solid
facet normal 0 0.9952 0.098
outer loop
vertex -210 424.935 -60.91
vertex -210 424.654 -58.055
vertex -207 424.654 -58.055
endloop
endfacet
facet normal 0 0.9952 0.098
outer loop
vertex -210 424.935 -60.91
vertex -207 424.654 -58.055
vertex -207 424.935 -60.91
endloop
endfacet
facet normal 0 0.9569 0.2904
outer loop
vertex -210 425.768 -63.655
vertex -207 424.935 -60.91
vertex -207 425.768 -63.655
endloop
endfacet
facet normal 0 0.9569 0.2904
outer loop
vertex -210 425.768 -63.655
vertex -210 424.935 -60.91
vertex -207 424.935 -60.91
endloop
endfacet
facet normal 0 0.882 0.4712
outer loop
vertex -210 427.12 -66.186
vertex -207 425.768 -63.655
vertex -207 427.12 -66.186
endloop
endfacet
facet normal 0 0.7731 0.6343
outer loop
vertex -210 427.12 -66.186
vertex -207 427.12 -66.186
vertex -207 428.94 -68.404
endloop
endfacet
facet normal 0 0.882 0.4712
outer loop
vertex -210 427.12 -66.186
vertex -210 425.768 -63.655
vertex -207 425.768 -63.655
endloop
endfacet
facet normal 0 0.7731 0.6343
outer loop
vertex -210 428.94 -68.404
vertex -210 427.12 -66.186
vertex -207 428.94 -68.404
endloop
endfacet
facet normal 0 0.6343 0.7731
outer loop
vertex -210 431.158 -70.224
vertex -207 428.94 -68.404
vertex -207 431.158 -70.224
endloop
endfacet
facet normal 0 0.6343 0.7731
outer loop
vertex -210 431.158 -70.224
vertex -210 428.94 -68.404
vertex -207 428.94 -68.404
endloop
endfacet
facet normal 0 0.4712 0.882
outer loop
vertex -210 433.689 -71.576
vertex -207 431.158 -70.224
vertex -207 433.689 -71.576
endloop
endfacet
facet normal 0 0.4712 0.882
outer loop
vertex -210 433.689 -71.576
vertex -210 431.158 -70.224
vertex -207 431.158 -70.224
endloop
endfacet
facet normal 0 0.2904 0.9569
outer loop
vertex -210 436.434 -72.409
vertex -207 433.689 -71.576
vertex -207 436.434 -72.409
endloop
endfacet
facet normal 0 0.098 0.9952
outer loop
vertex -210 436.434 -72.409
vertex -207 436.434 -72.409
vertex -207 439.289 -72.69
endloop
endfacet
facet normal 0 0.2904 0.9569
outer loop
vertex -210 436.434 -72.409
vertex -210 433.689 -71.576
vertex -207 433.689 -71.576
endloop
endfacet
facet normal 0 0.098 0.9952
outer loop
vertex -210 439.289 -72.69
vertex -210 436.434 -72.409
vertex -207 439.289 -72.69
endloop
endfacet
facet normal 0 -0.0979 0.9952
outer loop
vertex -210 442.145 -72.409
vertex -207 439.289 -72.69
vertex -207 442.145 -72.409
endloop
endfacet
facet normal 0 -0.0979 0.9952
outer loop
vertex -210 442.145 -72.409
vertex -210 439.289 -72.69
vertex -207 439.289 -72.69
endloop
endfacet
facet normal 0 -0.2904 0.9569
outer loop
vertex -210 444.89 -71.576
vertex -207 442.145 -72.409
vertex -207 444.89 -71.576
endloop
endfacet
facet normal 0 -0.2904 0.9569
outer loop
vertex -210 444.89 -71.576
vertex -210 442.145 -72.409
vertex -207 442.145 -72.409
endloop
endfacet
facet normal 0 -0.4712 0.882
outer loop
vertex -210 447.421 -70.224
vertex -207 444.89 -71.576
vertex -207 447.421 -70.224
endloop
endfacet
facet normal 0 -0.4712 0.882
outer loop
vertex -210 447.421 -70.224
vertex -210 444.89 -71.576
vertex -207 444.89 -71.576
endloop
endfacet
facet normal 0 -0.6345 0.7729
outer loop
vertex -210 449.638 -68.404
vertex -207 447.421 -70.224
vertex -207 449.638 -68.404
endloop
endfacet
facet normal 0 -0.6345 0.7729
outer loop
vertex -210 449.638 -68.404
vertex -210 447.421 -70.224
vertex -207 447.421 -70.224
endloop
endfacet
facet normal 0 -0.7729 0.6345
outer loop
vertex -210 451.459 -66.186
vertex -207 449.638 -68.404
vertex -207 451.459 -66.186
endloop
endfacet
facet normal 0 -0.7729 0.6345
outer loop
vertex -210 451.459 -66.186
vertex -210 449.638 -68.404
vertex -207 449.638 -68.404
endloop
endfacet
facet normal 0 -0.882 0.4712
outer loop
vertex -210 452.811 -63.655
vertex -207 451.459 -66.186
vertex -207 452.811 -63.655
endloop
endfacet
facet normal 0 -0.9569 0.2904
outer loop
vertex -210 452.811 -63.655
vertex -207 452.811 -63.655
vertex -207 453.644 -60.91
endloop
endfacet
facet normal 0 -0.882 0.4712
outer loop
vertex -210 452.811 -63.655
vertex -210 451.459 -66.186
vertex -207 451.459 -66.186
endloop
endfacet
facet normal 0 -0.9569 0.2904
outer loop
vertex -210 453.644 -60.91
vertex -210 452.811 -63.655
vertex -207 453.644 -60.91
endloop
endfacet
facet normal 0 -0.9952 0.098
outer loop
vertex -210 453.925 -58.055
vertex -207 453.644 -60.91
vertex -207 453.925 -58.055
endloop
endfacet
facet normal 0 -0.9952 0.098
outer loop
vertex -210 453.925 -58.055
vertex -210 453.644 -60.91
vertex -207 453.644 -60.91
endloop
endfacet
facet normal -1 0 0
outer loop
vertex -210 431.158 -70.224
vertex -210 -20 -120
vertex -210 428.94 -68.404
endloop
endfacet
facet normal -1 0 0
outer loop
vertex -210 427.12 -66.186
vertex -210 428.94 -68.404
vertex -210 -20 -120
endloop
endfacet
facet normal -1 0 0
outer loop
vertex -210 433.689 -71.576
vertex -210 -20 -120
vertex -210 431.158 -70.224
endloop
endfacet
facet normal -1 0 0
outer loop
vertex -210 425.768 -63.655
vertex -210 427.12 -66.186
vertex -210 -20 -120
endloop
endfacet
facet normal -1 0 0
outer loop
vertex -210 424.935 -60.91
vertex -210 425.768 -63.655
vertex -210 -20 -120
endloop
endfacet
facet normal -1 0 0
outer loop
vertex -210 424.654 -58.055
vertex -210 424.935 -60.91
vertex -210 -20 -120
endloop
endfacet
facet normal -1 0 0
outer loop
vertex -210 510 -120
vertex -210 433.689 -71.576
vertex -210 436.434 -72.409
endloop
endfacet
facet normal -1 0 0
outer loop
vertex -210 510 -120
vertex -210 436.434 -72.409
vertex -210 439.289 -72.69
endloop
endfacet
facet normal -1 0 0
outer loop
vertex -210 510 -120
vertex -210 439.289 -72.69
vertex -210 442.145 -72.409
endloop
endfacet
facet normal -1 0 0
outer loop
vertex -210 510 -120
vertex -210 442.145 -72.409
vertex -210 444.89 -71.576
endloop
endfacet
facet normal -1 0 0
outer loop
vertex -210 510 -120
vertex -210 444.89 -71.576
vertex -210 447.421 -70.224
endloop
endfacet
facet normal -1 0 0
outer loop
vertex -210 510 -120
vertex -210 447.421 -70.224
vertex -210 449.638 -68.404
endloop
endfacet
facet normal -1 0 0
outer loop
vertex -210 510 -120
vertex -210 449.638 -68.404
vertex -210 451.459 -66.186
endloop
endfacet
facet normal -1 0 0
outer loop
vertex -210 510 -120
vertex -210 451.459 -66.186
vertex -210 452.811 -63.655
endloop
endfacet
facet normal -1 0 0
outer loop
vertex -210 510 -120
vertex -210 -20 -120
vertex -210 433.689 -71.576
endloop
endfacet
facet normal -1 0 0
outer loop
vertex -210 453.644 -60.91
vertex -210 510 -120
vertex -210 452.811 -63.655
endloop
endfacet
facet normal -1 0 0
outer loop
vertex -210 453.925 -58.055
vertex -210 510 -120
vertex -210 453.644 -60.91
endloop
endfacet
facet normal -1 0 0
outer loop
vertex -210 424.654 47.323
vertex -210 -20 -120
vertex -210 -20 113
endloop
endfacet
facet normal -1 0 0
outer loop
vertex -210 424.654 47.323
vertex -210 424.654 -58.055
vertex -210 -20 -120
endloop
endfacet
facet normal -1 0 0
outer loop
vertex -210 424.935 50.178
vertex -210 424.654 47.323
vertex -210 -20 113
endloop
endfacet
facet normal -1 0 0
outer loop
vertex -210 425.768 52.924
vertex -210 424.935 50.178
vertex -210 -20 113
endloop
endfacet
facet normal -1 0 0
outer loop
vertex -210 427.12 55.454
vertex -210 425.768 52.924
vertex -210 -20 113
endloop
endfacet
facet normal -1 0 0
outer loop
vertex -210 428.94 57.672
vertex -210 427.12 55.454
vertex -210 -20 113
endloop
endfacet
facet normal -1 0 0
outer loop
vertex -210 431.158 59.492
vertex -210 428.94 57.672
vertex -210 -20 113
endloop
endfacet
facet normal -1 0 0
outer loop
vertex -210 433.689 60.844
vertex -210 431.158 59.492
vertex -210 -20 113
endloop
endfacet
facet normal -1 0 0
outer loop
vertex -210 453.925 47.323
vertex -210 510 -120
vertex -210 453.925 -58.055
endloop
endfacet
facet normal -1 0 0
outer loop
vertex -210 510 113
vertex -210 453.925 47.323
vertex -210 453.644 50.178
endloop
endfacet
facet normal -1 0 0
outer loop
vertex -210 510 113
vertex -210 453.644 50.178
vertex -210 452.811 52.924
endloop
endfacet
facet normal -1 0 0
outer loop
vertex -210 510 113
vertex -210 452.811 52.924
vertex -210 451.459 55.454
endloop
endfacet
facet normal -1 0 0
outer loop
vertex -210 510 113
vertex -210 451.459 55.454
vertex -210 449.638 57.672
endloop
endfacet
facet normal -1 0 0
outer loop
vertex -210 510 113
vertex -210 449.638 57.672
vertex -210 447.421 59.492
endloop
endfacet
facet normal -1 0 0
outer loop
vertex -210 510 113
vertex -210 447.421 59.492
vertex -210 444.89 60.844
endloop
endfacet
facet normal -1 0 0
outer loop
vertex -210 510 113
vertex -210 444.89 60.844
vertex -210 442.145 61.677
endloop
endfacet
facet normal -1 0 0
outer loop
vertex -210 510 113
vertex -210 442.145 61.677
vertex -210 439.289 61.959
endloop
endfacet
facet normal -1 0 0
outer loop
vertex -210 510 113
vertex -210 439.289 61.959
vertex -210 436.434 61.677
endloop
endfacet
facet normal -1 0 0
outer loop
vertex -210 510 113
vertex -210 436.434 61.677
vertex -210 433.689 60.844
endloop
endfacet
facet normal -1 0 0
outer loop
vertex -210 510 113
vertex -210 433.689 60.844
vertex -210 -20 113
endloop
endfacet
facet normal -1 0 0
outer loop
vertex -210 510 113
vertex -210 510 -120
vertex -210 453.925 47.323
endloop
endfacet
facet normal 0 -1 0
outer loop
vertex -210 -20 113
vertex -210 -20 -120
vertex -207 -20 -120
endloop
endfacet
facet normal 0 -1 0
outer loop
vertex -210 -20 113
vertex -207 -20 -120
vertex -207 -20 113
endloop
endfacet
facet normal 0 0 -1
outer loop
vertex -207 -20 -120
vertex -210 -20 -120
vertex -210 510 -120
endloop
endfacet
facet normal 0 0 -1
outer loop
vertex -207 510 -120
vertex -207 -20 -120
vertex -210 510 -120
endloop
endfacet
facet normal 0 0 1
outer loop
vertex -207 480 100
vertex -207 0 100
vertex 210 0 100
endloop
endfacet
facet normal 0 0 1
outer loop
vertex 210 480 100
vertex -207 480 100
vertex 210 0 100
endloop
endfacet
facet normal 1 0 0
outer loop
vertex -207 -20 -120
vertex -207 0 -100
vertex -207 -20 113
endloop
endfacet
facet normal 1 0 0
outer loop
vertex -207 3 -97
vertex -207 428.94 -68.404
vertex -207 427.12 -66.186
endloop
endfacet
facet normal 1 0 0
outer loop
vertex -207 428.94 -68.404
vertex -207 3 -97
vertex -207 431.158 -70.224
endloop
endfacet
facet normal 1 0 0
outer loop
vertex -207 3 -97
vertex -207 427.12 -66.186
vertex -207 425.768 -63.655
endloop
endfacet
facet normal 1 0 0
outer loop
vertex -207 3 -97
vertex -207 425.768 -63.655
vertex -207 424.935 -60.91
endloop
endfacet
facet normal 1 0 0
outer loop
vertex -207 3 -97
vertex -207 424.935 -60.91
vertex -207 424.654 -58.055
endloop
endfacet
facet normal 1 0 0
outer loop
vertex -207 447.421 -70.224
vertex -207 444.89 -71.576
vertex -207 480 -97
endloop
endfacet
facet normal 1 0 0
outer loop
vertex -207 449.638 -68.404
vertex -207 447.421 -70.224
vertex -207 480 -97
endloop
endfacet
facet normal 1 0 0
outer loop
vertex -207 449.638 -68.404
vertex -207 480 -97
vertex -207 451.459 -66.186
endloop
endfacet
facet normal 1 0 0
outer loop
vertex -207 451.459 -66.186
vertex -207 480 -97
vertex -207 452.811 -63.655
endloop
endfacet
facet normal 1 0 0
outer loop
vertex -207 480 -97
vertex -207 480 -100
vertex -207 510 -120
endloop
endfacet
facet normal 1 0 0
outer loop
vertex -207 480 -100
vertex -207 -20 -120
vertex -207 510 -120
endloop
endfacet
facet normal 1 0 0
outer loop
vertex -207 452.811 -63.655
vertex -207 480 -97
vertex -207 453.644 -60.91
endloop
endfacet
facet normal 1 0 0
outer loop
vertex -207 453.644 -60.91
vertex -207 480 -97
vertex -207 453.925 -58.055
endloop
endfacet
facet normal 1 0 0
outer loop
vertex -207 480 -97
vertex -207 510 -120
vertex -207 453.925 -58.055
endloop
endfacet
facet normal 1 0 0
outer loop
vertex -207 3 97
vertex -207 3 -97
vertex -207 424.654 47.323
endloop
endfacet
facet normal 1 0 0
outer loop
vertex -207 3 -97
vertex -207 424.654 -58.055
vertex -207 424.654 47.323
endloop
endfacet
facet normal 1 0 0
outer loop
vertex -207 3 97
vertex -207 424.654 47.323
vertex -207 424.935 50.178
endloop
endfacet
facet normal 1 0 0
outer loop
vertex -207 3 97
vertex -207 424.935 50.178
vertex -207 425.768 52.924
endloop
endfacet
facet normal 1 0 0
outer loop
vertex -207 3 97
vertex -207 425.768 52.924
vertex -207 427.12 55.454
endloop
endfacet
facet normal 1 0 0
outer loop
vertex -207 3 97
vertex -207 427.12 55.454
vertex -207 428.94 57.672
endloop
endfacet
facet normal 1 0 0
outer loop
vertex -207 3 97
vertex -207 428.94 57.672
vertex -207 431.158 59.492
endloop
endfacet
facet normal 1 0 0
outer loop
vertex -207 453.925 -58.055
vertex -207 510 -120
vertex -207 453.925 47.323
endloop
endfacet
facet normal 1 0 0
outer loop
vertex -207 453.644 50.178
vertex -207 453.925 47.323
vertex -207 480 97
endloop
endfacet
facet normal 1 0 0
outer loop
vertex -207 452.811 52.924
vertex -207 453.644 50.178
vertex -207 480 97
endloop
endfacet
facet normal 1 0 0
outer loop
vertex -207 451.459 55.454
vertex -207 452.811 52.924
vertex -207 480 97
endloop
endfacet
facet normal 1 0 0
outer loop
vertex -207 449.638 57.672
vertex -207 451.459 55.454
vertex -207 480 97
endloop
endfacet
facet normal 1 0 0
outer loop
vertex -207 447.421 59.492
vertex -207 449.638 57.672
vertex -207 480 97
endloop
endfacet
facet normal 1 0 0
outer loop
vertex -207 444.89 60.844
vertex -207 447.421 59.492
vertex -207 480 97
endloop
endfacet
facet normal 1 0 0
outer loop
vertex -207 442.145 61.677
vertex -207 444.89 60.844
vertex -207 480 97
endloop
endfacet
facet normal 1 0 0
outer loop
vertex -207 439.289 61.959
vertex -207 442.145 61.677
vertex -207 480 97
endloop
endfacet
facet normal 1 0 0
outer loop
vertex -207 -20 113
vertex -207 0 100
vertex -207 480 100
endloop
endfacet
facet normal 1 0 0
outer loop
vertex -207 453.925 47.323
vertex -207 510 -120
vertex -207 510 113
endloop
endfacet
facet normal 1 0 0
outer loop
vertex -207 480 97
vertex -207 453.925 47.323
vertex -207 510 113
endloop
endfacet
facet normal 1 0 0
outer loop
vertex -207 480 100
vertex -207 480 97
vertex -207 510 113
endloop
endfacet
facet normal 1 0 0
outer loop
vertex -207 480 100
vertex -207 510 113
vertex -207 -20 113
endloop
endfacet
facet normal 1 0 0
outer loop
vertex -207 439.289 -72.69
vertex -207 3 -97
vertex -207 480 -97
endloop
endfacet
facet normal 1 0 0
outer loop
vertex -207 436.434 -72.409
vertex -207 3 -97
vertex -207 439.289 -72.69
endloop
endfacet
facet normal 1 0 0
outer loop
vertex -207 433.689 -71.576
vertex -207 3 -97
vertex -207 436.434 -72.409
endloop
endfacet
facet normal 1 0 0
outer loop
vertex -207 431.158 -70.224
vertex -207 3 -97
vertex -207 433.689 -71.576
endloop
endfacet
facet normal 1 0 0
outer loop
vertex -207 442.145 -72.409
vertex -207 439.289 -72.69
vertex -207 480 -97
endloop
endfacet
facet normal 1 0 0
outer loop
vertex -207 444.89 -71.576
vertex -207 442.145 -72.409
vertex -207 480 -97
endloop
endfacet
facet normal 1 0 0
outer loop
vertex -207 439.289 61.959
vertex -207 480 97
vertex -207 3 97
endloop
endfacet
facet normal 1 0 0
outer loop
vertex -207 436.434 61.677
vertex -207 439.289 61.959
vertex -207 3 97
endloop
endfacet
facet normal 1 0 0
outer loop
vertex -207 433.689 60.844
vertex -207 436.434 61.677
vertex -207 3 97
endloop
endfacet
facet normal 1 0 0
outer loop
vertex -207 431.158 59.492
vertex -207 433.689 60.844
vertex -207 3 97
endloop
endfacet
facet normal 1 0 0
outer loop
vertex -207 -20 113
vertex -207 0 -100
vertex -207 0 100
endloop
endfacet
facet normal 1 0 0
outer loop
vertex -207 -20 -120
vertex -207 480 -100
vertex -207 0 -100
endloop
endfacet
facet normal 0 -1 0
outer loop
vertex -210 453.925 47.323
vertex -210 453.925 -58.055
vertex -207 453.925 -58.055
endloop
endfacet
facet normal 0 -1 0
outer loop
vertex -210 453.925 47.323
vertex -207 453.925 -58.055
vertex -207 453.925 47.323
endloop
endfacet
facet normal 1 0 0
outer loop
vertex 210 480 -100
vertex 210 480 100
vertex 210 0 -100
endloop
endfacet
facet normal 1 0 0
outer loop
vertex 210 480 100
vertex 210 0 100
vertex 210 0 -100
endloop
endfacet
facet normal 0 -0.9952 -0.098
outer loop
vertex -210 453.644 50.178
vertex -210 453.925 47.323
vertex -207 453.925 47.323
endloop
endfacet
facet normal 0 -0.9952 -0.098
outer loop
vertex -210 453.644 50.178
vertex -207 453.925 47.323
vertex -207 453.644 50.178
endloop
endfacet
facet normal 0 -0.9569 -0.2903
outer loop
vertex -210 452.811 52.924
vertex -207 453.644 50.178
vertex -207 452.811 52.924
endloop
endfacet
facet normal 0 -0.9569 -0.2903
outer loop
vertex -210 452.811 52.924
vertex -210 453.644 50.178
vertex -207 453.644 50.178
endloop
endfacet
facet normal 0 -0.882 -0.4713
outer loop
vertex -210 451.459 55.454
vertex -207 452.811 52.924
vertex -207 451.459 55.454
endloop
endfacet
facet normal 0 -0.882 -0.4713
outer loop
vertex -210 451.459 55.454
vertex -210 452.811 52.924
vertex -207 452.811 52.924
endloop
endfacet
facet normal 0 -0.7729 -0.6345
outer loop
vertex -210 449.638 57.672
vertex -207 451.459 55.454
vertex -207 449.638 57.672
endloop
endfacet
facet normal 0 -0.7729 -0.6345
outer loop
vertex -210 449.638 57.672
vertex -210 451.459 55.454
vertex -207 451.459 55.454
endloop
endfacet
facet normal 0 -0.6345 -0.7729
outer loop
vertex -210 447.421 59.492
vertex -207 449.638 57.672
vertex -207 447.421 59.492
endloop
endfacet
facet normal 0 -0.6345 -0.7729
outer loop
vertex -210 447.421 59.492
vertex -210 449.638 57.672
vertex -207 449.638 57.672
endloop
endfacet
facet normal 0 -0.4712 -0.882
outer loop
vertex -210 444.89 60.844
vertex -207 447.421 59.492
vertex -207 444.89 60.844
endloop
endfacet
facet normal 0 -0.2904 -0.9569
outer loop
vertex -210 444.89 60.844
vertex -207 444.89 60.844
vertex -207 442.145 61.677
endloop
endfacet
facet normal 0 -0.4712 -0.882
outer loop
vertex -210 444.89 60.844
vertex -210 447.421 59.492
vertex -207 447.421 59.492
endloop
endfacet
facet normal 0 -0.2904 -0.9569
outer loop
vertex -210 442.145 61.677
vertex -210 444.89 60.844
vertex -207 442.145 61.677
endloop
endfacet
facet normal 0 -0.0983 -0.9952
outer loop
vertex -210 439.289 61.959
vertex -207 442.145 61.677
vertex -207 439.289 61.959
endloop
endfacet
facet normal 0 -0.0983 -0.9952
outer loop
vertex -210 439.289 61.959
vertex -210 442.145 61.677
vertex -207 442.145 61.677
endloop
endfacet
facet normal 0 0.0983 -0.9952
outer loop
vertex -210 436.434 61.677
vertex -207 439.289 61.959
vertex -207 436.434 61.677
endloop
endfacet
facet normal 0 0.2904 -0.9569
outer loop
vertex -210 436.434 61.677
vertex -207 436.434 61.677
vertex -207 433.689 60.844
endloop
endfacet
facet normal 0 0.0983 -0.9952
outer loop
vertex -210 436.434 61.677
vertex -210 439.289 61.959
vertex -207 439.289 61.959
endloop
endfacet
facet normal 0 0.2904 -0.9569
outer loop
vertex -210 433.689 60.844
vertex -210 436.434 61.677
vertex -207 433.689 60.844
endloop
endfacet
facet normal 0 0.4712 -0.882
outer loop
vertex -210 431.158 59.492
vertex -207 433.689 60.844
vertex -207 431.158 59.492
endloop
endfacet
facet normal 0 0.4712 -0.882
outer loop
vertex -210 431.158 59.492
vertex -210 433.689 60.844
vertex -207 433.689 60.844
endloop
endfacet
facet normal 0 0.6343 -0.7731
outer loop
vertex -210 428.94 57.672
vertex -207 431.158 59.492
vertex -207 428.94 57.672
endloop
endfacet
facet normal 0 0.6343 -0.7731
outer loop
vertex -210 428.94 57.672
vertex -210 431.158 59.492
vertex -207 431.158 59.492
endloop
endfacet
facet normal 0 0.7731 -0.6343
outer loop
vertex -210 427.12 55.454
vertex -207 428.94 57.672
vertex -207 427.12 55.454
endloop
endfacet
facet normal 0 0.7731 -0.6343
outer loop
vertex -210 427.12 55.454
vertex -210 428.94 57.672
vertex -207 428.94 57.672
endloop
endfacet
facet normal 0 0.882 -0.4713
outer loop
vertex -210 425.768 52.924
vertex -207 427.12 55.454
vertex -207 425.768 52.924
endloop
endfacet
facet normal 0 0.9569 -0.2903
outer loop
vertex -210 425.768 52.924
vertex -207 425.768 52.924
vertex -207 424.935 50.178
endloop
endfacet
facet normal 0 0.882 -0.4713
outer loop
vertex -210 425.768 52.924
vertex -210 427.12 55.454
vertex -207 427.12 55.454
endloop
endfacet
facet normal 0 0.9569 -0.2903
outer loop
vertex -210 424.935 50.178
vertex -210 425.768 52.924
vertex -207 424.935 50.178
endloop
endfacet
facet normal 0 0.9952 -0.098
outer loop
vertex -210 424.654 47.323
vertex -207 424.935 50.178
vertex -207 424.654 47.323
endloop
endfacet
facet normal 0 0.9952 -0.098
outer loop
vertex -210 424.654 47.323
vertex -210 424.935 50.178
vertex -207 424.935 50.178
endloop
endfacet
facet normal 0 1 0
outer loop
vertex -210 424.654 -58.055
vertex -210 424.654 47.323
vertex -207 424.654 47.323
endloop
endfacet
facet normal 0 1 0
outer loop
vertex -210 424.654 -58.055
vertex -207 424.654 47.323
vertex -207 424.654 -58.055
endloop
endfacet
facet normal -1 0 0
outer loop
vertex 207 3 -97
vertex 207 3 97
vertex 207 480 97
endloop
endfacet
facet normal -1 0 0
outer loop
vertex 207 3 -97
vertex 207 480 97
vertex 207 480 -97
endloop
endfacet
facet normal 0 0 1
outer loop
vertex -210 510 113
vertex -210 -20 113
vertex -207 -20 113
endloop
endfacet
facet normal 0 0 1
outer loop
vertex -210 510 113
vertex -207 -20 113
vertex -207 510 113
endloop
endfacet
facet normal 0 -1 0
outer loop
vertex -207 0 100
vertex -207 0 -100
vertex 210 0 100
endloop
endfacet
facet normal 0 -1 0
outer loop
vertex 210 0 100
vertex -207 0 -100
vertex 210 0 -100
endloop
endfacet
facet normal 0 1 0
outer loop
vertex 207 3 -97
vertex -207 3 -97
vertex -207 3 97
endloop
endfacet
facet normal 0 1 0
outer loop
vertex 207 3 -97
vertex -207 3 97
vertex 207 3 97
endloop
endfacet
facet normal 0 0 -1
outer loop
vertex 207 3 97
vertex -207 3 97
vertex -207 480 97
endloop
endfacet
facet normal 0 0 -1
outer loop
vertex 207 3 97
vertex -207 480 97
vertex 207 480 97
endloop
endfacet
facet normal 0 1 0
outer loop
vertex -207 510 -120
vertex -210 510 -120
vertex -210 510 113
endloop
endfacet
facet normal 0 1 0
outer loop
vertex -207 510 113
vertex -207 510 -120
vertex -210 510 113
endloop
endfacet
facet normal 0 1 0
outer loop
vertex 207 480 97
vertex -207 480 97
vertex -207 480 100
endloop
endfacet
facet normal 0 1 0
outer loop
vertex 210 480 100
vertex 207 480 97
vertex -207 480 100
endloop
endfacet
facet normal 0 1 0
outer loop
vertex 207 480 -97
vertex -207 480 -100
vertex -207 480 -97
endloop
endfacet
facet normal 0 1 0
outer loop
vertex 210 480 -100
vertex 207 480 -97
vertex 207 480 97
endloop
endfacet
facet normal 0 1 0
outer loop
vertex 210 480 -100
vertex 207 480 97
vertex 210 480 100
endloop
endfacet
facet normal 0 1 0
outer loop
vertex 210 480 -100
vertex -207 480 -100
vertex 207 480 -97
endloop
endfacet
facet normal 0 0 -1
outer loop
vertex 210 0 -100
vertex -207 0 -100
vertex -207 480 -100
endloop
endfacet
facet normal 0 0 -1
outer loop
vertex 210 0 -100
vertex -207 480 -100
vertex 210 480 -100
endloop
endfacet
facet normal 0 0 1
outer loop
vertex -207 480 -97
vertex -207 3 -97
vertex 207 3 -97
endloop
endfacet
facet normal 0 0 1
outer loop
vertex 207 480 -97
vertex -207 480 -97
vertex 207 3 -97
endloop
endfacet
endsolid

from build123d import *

# Parameters (mm, degrees)
SKETCH_1_W          = 420
SKETCH_1_H          = 200
EXTRUDE_1_DEPTH     = 3
SKETCH_2_W          = 420
SKETCH_2_H          = 200
SKETCH_2_W_2        = 414
SKETCH_2_H_2        = 194
EXTRUDE_1_2_DEPTH   = 477
SKETCH_4_W          = 233
SKETCH_4_H          = 530
EXTRUDE_2_DEPTH     = 3
CUT_EXTRUDE_1_DEPTH = 3


with BuildPart() as part:
    # 草图1 → Extrude 1 (new body)
    with BuildSketch(Plane(origin=(0, 0, 0), x_dir=(1, 0, 0), z_dir=(0, 1, 0))):
        Rectangle(SKETCH_1_W, SKETCH_1_H)
    extrude(amount=EXTRUDE_1_DEPTH)

    # 草图2 → Extrude 1 2 (add)
    with BuildSketch(Plane(origin=(0, 3, 0), x_dir=(1, 0, 0), z_dir=(0, 1, 0))):
        Rectangle(SKETCH_2_W, SKETCH_2_H)
        Rectangle(SKETCH_2_W_2, SKETCH_2_H_2, mode=Mode.SUBTRACT)
    extrude(amount=EXTRUDE_1_2_DEPTH)

    # 草图4 → 凸台-拉伸2 (add)
    with BuildSketch(Plane.ZY.offset(210)):
        with Locations((-3.5, 245)):
            Rectangle(SKETCH_4_W, SKETCH_4_H)
    extrude(amount=-EXTRUDE_2_DEPTH)

    # 草图5 → 切除-拉伸1 (cut)
    with BuildSketch(Plane.ZY.offset(210)):
        with BuildLine():
            Line((-58.054561009, 453.925202317), (47.32277396, 453.925202317))
            ThreePointArc((47.32277396, 453.925202317), (61.958514928, 439.289461349), (47.32277396, 424.653720381))
            Line((47.32277396, 424.653720381), (-58.054561009, 424.653720381))
            ThreePointArc((-58.054561009, 424.653720381), (-72.690301977, 439.289461349), (-58.054561009, 453.925202317))
        make_face()
    extrude(amount=-CUT_EXTRUDE_1_DEPTH, mode=Mode.SUBTRACT)


solid = part.part
